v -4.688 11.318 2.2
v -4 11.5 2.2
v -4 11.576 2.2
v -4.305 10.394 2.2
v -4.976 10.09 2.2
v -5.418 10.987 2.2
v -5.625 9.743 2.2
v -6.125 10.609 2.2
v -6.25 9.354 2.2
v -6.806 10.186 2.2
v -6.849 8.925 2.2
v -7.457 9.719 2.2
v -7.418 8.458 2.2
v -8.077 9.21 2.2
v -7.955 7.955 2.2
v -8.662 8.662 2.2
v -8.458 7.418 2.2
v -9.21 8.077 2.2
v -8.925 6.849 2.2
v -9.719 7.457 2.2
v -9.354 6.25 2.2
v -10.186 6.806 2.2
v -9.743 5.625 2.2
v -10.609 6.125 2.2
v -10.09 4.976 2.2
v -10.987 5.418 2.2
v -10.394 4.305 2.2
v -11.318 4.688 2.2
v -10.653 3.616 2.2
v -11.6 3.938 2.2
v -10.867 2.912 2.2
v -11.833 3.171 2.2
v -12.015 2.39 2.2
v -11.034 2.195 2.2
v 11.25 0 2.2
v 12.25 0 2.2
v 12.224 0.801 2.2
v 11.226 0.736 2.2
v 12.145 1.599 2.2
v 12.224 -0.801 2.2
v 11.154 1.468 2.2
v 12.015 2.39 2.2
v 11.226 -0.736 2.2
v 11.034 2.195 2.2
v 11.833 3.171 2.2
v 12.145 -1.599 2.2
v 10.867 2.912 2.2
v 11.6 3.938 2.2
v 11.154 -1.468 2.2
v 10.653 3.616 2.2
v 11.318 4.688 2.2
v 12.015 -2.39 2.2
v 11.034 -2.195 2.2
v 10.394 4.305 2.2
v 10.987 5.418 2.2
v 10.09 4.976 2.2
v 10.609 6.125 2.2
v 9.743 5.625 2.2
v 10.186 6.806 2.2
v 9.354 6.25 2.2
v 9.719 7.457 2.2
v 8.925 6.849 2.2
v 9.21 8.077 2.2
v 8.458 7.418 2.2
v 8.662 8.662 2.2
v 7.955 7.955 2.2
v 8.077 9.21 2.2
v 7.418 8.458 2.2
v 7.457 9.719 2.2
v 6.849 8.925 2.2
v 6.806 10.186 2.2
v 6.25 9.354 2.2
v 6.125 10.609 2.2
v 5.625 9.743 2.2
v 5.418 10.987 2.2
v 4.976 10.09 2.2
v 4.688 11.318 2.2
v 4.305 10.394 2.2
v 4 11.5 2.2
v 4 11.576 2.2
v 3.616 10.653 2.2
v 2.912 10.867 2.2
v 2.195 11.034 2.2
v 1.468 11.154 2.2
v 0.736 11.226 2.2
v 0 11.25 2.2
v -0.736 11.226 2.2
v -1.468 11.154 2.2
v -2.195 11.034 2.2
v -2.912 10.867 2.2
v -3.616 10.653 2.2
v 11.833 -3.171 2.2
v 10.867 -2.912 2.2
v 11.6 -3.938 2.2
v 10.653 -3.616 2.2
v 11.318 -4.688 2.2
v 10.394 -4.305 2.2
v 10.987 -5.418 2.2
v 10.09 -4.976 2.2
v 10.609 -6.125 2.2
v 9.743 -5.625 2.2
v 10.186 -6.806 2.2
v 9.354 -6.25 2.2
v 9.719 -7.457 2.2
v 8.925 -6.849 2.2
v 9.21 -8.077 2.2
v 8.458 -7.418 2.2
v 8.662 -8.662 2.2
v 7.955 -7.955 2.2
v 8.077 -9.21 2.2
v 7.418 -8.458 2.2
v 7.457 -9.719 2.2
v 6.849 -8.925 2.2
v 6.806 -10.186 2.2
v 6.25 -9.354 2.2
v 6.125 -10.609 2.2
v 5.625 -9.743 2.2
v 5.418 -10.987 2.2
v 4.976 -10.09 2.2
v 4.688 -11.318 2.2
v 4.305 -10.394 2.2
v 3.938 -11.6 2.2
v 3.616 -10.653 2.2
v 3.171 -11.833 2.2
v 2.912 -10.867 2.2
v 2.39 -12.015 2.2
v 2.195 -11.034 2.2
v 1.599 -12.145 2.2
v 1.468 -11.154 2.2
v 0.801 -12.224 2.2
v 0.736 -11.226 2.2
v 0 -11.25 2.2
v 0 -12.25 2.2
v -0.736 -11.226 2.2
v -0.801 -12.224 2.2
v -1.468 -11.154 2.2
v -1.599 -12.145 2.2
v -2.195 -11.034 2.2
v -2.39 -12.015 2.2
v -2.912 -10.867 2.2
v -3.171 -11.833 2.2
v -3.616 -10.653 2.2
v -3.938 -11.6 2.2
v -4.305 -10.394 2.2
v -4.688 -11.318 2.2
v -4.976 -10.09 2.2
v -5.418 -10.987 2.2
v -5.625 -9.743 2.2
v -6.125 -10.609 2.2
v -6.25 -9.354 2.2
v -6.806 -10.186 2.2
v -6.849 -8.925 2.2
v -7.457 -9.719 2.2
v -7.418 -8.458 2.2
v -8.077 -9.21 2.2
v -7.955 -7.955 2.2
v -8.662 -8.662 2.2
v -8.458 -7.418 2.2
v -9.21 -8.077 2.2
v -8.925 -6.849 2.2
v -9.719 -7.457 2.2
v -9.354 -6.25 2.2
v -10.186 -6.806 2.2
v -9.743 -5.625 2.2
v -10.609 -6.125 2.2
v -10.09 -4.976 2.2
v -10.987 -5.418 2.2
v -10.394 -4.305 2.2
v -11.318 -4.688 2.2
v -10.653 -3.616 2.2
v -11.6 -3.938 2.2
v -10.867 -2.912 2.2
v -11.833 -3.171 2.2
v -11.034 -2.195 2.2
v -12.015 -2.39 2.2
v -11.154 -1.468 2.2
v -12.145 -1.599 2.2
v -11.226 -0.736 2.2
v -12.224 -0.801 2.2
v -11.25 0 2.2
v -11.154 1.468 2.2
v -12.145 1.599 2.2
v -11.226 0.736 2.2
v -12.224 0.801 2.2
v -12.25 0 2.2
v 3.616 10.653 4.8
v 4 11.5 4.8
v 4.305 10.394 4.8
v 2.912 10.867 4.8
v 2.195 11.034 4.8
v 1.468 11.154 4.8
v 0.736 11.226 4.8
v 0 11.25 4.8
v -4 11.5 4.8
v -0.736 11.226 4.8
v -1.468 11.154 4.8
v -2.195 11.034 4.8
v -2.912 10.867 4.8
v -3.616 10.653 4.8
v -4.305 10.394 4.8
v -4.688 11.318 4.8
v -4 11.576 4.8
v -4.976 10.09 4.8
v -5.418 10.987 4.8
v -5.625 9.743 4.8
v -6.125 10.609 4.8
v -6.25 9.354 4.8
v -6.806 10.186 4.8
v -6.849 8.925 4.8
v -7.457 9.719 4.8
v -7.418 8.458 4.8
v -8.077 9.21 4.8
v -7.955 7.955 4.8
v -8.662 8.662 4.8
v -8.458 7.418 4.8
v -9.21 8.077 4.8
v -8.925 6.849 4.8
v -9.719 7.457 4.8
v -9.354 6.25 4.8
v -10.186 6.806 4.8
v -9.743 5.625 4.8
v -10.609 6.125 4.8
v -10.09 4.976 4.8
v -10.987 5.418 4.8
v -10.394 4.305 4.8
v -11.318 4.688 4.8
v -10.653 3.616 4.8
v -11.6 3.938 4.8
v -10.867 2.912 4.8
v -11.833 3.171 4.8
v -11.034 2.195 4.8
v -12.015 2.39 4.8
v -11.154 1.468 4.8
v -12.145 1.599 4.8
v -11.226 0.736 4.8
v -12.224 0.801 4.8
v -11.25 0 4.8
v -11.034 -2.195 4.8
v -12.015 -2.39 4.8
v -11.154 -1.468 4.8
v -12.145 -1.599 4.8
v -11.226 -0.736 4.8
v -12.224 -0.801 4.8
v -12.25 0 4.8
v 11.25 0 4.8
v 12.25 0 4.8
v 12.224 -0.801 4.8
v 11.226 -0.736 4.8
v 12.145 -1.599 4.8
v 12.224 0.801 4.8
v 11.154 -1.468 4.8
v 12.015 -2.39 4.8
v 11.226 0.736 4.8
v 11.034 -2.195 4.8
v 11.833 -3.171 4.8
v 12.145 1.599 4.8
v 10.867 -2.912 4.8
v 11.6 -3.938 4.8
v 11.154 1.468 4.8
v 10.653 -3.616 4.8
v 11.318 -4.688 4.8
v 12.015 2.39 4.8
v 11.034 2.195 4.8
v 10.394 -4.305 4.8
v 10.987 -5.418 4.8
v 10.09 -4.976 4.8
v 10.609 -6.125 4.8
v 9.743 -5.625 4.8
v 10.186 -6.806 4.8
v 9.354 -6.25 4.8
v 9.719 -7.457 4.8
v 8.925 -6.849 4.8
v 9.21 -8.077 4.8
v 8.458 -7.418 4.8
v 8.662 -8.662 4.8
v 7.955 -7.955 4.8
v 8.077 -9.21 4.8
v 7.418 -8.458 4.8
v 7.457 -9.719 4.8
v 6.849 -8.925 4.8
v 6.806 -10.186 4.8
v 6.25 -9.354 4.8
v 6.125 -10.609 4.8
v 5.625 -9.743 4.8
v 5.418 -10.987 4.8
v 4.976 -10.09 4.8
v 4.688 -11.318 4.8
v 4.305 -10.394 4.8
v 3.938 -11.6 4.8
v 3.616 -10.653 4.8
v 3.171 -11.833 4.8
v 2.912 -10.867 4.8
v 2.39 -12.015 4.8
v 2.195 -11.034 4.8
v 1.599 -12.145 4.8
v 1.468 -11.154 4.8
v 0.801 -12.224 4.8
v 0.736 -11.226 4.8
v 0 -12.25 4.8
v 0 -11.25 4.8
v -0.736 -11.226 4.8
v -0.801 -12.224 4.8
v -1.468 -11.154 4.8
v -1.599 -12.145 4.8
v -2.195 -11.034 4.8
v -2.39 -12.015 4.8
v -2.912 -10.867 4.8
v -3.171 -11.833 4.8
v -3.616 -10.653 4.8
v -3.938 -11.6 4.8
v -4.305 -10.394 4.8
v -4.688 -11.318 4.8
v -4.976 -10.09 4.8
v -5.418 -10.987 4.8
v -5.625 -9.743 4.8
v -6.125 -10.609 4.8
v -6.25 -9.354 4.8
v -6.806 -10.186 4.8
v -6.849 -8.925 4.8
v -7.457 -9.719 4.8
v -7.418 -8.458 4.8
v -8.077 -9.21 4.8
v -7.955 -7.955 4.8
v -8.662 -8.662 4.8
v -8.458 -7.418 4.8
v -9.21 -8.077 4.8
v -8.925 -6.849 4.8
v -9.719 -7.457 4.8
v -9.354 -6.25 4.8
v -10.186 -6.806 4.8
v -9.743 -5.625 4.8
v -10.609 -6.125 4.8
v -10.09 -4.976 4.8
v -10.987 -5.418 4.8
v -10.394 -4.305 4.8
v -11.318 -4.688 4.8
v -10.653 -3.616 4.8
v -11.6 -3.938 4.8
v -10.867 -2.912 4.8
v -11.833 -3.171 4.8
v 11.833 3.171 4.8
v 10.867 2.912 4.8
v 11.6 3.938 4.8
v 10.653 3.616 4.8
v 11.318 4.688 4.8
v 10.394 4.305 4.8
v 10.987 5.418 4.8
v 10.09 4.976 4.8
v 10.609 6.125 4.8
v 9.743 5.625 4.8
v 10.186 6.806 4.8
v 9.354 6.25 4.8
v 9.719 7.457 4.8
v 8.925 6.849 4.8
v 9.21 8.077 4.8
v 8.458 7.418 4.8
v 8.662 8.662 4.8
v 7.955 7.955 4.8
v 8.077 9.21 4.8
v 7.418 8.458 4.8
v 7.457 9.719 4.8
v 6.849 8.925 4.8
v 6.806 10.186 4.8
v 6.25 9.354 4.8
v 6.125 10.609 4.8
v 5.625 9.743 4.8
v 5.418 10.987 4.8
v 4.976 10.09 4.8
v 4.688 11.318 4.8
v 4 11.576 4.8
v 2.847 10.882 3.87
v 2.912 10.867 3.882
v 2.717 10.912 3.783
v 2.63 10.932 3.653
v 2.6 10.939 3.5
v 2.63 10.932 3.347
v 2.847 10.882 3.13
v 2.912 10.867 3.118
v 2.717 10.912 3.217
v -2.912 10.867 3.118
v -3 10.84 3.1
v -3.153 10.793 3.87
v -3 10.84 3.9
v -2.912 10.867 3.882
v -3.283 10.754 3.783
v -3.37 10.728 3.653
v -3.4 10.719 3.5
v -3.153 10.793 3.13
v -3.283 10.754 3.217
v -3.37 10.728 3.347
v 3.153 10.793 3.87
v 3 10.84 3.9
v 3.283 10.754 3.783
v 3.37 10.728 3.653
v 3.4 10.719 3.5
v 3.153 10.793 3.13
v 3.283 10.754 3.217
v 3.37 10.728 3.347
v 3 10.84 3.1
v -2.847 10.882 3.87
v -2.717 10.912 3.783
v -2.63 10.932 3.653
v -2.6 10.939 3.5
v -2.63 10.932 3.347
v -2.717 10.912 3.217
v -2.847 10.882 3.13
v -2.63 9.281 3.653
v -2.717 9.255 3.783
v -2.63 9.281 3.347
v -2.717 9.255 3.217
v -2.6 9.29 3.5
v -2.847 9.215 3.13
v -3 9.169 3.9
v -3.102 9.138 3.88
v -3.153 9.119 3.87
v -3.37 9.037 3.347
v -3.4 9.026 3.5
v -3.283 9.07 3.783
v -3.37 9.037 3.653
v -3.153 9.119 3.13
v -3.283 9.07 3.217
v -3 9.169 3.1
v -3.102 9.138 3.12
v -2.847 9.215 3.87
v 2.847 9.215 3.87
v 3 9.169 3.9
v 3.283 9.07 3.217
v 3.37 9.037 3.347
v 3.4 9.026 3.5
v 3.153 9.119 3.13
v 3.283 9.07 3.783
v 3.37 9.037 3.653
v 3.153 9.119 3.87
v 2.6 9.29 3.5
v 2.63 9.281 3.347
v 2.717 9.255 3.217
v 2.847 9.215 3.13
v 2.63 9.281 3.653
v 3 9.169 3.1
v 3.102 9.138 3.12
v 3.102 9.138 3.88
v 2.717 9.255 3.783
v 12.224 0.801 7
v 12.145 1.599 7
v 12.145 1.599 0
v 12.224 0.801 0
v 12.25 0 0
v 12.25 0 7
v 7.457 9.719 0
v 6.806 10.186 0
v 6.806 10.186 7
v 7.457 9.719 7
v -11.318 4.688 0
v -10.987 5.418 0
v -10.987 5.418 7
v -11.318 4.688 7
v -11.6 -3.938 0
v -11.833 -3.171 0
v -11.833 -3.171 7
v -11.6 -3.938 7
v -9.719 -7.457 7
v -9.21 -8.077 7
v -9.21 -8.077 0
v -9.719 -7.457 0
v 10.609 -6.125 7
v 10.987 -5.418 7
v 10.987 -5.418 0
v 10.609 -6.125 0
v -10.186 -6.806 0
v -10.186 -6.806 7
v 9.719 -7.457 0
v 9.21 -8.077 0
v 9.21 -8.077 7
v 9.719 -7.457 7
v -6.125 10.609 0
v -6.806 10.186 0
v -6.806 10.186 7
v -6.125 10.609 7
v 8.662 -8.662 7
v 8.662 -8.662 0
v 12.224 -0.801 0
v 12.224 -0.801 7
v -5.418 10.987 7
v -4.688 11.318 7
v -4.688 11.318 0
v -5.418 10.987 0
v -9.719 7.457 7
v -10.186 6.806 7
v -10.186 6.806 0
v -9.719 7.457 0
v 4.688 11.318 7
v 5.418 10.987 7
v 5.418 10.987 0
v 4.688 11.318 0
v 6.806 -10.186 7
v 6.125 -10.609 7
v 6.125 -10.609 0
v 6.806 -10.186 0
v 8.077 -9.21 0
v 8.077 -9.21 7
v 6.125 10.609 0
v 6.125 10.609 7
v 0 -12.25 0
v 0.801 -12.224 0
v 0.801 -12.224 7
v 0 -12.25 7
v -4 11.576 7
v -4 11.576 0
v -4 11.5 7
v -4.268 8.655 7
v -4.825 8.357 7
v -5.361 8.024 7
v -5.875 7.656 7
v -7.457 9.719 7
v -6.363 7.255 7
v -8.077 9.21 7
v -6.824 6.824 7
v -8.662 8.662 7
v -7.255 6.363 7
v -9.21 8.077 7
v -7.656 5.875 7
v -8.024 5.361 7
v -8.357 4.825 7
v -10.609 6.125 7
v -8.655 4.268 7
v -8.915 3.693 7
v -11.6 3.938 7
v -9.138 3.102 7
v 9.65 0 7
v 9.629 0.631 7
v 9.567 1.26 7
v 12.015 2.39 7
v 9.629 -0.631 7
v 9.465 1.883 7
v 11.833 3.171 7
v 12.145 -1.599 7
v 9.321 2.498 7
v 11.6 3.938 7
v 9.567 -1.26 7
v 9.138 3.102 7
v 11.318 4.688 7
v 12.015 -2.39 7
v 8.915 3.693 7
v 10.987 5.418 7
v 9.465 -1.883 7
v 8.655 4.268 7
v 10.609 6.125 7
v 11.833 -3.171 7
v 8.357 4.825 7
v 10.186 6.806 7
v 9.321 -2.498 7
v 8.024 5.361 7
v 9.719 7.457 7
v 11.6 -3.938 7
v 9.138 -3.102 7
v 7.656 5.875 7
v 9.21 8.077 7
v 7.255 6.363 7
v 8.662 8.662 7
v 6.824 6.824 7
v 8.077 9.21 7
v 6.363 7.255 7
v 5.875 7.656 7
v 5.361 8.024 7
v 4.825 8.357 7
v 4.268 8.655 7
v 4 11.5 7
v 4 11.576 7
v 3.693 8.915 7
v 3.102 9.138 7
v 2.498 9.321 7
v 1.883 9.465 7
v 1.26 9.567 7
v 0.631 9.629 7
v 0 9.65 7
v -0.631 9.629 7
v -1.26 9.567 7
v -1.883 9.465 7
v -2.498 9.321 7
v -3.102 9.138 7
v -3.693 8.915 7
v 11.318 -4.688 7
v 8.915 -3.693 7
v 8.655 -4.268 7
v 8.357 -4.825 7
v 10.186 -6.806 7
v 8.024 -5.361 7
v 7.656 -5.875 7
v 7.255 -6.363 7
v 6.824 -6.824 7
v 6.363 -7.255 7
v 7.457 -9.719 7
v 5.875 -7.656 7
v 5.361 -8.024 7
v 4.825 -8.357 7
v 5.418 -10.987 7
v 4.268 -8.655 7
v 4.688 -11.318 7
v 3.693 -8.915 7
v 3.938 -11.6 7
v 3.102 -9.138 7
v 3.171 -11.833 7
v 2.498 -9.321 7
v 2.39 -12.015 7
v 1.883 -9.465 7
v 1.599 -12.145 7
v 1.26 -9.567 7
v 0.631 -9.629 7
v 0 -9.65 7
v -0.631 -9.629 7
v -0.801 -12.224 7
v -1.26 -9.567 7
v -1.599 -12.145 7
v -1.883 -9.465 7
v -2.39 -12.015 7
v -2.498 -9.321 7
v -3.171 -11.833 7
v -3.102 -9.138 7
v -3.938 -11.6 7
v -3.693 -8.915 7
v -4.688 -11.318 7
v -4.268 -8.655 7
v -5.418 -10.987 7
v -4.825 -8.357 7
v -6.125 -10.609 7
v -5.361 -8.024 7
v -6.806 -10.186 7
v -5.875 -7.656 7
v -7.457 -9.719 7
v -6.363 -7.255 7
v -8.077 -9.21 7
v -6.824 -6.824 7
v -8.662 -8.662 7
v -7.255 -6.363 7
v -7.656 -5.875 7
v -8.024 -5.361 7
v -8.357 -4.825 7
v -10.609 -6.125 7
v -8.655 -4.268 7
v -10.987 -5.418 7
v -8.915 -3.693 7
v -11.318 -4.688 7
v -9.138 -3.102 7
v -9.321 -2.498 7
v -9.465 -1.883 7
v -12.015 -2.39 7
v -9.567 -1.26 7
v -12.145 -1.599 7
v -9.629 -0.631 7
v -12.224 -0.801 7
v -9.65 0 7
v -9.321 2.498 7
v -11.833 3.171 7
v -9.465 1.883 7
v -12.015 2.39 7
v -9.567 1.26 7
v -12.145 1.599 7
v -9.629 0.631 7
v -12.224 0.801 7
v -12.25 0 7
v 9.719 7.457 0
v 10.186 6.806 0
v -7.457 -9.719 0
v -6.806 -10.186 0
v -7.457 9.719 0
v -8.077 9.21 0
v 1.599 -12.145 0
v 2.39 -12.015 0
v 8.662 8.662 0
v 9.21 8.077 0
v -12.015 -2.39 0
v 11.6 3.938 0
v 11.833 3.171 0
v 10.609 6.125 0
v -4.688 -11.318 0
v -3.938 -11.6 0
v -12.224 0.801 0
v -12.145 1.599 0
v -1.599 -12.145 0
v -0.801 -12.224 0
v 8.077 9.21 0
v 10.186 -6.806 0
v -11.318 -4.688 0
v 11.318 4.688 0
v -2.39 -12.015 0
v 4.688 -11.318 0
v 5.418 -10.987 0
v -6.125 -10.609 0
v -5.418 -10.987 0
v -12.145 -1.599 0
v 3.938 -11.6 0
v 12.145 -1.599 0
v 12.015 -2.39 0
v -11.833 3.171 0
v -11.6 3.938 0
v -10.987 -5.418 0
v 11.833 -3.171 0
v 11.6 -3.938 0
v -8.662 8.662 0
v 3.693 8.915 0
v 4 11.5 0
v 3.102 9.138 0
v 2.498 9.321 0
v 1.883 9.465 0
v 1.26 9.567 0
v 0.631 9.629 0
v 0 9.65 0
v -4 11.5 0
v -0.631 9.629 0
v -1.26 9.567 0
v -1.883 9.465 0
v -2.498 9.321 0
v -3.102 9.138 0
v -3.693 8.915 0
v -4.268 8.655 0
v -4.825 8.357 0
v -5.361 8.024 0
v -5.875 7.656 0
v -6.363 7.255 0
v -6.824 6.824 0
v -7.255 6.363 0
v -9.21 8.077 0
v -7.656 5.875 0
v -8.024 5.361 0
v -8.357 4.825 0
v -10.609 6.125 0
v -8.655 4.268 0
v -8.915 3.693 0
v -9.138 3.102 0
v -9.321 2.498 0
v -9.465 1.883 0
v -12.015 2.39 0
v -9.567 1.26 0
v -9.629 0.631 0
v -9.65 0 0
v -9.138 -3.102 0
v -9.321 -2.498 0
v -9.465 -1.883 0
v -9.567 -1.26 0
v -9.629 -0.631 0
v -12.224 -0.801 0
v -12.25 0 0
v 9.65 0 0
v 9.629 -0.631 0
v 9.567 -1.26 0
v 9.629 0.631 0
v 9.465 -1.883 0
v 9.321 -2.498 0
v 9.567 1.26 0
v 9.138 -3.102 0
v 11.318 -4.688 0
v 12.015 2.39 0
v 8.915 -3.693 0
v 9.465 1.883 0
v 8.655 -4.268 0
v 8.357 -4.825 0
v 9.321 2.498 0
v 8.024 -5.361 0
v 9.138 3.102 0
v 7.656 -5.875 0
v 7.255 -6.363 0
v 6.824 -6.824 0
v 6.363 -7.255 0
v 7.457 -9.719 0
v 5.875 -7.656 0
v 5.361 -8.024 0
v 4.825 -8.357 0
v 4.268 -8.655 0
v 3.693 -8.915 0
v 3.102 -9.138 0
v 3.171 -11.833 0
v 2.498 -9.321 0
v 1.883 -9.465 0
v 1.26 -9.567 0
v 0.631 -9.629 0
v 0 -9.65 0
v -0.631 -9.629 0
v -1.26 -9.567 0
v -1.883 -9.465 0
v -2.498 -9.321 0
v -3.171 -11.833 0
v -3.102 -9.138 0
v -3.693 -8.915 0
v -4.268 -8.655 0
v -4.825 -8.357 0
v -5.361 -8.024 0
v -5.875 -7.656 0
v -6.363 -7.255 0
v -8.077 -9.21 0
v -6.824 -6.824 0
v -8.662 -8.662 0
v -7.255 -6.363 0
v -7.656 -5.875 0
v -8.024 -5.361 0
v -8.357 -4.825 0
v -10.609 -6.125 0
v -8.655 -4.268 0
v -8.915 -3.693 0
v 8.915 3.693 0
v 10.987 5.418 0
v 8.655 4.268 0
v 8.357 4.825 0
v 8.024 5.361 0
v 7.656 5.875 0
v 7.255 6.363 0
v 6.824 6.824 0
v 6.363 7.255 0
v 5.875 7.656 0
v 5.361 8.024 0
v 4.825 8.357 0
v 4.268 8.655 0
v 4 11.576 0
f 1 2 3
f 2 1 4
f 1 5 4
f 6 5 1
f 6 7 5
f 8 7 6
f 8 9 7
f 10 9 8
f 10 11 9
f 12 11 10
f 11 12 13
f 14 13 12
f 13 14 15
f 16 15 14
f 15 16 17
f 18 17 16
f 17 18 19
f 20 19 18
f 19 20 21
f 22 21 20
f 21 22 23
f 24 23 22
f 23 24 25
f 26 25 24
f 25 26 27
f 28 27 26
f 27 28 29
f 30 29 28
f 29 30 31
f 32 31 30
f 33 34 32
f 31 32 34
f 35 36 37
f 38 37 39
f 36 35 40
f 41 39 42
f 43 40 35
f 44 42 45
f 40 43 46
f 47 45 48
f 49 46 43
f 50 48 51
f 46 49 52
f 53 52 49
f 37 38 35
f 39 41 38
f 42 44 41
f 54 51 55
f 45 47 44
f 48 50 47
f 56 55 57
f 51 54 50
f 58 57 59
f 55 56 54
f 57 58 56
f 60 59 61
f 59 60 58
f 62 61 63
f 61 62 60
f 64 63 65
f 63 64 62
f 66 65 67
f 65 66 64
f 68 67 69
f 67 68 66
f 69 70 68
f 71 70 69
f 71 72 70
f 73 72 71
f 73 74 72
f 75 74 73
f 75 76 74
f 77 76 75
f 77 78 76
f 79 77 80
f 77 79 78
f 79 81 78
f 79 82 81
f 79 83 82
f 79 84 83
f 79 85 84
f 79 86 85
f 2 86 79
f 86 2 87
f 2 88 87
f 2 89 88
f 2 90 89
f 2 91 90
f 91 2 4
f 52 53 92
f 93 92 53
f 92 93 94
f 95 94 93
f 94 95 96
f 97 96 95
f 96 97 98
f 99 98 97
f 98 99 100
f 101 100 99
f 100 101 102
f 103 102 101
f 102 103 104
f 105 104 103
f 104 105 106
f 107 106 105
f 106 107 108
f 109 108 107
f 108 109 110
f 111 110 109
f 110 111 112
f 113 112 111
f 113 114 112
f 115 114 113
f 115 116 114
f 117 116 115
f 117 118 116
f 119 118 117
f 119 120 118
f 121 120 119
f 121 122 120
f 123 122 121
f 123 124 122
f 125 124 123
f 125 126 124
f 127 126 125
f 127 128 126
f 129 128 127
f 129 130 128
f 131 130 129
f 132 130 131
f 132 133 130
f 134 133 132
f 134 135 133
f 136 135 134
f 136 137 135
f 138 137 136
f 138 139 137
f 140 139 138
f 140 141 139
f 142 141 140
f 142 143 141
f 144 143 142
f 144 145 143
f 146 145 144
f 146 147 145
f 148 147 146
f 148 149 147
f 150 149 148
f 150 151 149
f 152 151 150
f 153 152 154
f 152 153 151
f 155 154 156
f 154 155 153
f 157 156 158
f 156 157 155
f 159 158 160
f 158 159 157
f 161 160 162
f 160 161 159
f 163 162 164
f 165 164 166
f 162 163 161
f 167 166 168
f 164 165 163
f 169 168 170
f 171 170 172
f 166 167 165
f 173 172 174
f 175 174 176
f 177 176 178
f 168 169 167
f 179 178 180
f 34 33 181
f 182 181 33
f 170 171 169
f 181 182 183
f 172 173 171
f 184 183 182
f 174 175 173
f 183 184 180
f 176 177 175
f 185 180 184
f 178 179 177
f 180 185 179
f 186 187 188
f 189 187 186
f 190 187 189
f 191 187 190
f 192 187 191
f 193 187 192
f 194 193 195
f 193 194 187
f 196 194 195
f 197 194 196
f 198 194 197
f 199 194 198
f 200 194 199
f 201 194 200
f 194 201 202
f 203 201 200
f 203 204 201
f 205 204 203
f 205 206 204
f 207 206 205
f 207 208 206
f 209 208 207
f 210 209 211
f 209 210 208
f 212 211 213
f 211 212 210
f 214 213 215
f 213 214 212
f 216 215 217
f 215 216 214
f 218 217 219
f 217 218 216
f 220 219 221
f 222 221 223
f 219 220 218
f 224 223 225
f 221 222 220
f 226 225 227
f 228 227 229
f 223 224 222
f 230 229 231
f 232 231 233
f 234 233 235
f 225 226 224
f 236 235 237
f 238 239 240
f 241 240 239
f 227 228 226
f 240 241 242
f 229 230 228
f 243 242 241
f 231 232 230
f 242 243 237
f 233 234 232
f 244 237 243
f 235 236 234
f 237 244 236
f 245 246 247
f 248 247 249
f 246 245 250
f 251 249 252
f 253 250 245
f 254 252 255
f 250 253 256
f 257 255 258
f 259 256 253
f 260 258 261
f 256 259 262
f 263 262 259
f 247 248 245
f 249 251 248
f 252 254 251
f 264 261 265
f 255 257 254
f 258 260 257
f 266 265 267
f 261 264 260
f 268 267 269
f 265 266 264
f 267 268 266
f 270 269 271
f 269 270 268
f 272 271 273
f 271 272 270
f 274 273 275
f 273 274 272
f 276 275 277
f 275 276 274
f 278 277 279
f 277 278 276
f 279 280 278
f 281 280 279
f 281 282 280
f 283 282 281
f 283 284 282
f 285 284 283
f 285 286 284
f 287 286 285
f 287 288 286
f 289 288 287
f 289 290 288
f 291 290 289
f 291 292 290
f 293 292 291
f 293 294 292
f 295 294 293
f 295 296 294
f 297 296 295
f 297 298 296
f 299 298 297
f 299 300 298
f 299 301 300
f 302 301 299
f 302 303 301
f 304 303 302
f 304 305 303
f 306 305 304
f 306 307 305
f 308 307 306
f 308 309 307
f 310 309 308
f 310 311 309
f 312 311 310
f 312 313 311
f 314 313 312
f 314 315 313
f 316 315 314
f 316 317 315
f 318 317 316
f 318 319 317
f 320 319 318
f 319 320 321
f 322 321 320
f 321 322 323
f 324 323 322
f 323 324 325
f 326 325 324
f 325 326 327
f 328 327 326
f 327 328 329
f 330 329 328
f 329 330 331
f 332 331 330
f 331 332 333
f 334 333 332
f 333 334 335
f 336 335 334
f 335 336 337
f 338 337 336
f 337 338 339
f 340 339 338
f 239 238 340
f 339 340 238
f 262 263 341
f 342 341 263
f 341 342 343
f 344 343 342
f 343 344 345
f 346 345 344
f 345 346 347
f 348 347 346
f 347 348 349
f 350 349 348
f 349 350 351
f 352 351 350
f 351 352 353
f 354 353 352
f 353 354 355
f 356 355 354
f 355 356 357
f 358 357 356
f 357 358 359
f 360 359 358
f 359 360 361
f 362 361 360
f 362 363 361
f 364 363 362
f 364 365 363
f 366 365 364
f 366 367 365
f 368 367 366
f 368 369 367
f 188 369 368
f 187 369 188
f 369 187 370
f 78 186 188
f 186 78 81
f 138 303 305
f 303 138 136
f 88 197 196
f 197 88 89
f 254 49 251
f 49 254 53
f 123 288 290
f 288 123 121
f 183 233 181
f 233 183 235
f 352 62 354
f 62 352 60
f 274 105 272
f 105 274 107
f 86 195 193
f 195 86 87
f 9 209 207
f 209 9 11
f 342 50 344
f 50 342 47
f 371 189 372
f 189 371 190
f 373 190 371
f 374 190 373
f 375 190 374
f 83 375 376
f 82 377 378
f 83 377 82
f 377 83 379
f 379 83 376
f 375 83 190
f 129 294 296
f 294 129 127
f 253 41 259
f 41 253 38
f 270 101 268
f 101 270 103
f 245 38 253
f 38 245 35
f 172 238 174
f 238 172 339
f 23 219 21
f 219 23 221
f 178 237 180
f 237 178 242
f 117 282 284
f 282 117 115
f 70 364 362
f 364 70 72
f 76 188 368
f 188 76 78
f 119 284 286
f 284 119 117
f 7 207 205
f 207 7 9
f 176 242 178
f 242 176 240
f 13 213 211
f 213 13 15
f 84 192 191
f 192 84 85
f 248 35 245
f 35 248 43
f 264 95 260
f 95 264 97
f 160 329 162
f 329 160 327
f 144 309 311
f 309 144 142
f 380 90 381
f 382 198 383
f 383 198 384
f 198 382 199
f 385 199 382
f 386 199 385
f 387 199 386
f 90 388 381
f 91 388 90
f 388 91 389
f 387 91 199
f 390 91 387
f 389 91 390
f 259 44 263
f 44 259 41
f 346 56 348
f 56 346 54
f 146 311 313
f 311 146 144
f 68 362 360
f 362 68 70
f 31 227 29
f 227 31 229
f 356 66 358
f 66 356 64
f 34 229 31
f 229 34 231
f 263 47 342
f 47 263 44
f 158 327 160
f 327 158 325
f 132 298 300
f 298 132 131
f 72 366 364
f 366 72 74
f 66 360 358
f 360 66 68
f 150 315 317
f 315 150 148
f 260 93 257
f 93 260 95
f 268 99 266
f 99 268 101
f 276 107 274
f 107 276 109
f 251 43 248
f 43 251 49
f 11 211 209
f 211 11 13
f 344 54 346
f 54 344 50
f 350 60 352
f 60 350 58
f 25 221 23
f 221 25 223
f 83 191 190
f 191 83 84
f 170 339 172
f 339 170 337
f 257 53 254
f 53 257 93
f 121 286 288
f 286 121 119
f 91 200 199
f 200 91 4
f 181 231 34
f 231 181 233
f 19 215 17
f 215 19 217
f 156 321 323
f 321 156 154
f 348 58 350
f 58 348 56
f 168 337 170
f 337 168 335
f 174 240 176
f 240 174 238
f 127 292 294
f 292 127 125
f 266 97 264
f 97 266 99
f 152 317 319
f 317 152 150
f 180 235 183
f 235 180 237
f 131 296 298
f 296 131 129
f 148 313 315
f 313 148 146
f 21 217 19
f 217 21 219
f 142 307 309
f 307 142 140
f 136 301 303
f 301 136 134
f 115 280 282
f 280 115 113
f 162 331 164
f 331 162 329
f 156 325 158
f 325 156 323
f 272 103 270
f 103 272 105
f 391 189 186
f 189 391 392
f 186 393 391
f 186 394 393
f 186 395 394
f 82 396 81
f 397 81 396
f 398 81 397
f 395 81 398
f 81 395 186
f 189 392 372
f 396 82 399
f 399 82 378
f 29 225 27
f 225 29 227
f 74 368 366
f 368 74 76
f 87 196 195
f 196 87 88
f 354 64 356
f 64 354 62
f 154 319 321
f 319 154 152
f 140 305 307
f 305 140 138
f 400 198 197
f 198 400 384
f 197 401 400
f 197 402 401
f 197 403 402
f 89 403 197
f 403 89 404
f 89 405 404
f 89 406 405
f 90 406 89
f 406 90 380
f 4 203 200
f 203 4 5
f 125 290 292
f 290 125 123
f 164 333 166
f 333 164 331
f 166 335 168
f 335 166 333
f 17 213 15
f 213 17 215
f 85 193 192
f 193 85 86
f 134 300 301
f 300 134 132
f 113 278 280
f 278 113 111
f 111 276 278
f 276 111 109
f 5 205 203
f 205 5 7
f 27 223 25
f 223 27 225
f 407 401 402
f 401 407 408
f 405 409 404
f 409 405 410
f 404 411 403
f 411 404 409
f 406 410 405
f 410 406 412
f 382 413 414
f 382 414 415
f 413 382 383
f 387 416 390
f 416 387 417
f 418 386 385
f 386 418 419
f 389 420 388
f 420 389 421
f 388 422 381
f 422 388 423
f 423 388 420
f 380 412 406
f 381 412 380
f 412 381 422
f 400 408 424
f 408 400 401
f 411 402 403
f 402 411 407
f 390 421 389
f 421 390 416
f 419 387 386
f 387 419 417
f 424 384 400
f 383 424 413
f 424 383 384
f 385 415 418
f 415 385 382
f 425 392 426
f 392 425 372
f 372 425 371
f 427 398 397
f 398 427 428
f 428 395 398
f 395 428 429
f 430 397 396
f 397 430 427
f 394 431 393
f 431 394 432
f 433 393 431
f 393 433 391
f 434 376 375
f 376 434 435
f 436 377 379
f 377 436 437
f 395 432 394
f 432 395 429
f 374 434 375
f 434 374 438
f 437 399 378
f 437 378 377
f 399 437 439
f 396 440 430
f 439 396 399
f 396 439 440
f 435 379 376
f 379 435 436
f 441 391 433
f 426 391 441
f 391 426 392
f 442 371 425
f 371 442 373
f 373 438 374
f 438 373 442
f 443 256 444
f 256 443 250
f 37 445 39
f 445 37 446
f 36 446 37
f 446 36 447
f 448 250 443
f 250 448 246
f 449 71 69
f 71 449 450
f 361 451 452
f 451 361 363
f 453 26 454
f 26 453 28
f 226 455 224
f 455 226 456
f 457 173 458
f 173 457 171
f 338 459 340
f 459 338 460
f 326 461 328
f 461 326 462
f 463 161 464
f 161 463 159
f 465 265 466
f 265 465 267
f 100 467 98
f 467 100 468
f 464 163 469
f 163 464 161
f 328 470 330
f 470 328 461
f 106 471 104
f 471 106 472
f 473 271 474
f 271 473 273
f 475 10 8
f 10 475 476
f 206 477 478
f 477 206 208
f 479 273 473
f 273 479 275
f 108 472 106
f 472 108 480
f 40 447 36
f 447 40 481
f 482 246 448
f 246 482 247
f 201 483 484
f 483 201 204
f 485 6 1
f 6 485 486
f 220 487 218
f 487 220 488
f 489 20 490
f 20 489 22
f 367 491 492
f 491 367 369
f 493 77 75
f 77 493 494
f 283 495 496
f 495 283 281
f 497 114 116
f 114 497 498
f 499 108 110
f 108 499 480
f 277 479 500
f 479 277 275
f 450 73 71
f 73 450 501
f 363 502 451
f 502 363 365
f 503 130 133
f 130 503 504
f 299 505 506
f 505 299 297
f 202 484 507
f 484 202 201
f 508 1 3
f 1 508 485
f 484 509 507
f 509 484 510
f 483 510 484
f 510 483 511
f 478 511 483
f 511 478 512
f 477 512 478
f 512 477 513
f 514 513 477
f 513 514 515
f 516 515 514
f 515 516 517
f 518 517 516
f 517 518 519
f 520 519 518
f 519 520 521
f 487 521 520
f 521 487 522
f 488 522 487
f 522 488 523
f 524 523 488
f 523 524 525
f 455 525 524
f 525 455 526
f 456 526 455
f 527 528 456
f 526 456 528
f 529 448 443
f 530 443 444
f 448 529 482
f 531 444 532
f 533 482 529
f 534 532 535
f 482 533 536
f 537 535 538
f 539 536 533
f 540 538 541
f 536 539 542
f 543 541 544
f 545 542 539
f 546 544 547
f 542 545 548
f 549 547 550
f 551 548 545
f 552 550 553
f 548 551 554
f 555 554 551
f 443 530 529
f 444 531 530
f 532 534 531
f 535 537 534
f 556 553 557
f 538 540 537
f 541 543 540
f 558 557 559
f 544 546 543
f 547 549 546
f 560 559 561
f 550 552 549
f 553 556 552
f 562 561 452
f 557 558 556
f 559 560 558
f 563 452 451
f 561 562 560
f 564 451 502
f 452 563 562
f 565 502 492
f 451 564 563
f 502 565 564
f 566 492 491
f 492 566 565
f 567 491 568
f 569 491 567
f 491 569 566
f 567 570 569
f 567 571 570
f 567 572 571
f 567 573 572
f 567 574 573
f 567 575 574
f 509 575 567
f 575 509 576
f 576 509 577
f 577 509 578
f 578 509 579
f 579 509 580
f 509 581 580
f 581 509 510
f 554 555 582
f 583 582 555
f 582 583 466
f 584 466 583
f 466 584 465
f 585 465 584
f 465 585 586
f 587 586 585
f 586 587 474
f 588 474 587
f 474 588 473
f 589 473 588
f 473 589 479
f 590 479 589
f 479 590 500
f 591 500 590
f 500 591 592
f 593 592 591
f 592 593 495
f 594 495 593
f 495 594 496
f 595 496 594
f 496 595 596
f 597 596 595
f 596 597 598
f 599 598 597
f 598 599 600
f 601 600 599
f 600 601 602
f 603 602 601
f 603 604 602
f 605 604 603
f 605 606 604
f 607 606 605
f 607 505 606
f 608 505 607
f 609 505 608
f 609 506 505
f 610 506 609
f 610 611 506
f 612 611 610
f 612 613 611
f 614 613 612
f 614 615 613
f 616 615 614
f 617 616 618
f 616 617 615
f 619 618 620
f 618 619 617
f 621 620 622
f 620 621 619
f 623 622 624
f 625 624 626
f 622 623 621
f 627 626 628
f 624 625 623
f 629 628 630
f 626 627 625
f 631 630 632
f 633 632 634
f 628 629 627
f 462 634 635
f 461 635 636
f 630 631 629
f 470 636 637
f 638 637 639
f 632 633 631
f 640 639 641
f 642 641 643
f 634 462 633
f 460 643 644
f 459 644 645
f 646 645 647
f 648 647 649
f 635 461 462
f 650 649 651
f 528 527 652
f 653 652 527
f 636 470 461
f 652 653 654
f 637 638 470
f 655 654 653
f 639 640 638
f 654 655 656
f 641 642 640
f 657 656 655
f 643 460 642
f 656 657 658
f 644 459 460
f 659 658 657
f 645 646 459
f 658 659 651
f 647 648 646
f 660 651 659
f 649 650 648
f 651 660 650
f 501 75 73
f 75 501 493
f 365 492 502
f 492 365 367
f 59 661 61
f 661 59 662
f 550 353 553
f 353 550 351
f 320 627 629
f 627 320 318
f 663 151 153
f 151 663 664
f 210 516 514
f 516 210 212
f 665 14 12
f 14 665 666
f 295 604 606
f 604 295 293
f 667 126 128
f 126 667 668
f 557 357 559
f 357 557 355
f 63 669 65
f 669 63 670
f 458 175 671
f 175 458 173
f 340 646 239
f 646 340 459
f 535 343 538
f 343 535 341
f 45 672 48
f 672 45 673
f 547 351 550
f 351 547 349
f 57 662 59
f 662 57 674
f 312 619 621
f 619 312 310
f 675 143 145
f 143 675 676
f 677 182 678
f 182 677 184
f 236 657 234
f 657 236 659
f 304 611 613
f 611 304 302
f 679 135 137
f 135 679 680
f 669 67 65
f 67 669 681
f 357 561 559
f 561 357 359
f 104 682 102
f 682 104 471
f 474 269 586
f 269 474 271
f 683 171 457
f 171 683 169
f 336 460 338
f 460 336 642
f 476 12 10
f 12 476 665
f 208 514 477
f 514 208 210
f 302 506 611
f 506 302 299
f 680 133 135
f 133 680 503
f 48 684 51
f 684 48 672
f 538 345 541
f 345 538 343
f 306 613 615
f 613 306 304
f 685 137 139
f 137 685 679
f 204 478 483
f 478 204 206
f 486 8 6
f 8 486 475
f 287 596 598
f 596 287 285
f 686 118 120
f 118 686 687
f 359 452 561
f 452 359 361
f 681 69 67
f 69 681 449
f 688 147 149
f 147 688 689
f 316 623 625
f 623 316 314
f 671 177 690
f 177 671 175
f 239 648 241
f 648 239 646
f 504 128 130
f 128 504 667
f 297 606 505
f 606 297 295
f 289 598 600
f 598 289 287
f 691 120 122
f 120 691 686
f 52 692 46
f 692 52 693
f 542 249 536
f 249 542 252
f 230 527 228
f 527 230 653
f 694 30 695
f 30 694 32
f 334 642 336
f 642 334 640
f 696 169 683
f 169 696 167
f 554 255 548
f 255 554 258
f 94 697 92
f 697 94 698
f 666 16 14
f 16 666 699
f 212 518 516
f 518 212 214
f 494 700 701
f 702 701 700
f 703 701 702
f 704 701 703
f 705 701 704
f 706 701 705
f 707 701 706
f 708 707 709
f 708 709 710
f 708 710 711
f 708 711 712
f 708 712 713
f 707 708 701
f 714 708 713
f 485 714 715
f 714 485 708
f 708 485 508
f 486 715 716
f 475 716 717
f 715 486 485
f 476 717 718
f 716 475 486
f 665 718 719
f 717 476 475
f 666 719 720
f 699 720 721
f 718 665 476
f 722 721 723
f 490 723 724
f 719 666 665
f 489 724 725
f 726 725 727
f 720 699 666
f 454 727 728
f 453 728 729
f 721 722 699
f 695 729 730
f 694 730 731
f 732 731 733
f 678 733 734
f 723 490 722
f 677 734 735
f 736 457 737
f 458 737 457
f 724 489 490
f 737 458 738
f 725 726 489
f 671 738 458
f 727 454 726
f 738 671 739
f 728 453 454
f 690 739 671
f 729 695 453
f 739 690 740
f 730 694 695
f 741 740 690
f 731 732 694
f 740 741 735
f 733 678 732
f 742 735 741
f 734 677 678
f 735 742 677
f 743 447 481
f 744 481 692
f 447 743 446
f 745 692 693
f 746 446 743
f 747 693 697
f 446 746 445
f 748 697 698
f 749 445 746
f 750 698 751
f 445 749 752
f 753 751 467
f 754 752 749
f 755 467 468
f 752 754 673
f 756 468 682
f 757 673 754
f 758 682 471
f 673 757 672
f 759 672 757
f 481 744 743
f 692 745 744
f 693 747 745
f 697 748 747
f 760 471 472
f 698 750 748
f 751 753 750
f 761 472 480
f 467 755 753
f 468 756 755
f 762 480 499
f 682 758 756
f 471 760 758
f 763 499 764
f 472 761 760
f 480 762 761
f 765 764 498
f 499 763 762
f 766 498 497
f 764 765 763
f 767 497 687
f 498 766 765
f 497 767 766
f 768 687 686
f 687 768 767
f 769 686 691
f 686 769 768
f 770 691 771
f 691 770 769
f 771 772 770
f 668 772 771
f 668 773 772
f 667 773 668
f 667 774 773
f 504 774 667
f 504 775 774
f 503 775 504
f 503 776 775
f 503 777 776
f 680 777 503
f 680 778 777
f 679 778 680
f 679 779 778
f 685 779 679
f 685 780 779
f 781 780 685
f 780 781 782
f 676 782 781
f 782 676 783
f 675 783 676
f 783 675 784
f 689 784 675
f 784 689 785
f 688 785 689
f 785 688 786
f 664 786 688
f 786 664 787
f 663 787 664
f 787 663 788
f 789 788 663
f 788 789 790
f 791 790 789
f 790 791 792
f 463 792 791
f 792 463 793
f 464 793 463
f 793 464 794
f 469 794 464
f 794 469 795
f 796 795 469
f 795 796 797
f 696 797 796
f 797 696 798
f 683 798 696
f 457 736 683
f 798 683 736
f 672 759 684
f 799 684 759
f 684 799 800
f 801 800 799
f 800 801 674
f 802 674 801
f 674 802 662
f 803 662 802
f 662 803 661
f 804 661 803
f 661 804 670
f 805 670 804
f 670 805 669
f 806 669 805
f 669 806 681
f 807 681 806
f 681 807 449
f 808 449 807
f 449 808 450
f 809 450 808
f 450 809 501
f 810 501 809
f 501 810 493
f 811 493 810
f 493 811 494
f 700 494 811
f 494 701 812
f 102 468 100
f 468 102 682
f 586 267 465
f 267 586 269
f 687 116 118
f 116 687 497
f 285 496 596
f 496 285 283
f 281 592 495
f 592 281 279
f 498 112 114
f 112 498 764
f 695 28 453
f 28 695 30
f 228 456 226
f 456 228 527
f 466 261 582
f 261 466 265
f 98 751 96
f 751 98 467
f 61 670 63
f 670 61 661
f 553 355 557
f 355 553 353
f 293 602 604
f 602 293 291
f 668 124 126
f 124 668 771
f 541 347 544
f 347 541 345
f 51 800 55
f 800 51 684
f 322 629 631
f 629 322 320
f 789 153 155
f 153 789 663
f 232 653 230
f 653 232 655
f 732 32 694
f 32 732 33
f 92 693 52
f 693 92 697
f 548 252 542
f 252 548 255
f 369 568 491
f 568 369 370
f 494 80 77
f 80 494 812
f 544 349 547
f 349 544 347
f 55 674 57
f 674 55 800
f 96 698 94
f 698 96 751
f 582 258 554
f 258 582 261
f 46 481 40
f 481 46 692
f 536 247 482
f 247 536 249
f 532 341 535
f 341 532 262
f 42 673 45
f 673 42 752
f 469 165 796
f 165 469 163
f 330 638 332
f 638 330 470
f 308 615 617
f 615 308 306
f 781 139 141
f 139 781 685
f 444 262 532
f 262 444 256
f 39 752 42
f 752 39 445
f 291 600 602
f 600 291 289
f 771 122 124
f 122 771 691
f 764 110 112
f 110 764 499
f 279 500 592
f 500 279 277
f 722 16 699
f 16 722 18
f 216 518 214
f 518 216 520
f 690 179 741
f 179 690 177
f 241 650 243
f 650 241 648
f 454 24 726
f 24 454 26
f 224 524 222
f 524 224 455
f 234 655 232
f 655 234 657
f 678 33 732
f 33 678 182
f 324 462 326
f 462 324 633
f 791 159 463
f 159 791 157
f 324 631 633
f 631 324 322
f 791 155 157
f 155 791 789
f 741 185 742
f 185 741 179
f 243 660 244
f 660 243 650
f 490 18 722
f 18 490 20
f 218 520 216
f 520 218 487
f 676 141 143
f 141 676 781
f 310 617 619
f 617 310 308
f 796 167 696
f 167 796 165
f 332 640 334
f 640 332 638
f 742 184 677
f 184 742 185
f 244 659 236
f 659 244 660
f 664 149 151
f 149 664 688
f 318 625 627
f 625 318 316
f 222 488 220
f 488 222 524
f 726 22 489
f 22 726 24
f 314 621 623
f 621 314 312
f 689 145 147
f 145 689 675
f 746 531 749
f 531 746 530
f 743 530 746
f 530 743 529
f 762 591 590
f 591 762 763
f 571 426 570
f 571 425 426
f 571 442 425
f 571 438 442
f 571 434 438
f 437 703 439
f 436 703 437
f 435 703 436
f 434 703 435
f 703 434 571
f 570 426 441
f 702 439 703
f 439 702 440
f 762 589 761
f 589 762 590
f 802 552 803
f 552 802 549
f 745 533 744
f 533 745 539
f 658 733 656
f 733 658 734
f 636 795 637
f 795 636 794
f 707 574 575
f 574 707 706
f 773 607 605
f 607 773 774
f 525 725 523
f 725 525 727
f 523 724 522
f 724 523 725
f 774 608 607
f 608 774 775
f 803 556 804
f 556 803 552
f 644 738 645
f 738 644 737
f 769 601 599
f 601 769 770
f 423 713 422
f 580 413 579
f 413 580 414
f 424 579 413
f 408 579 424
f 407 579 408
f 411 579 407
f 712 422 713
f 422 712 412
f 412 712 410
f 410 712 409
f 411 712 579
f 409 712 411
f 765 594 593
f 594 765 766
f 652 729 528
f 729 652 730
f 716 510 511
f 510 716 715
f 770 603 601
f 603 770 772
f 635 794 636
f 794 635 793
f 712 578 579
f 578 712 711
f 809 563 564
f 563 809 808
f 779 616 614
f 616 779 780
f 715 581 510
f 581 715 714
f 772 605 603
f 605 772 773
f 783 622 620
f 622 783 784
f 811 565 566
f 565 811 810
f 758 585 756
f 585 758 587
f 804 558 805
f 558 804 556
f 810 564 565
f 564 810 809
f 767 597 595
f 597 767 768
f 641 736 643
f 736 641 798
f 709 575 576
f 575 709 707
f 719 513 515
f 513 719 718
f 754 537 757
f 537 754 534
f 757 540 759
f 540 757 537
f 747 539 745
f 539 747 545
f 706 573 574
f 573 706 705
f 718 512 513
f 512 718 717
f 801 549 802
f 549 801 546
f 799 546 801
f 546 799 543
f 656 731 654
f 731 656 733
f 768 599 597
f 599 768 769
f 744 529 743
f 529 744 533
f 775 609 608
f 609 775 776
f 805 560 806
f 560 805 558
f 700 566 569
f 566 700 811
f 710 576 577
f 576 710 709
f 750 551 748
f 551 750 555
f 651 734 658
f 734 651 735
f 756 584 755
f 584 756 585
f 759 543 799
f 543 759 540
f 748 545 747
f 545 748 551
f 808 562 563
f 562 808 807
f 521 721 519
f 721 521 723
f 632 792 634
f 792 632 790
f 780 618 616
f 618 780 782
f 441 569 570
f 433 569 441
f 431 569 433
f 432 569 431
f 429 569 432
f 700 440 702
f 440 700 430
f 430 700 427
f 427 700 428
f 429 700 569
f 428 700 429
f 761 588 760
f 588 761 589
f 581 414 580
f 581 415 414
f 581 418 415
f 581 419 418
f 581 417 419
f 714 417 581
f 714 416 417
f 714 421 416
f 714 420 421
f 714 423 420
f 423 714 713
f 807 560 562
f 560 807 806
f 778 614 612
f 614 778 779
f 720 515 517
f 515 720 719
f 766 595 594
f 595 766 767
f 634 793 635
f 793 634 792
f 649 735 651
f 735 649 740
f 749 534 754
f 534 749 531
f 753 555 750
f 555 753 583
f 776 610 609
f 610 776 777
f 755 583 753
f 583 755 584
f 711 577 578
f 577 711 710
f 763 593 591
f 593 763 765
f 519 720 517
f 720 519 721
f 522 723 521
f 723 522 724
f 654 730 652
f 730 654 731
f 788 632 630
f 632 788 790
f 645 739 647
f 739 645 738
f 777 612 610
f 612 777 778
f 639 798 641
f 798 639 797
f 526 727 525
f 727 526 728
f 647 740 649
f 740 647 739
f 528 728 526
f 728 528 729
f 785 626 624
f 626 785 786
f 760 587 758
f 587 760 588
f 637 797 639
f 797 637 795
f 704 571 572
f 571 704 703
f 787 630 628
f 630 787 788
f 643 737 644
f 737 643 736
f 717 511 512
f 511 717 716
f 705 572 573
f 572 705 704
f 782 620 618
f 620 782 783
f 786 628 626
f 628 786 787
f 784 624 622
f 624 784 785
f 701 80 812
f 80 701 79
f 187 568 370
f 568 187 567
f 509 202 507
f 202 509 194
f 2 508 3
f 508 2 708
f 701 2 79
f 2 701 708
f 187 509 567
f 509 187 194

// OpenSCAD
// Phase-2 antenna experiment jigs (non-payment NFC only).
//   coil_former : ring-sized former with a channel for winding test coils
//   pancake_jig : two-plate jig for winding flat (spiral) coils
include <gl_lib.scad>
part = "coil_former";  // "coil_former" | "pancake_base" | "pancake_top"
cf_h = 7; cf_wall = 1.6; ch_w = 2.6; ch_d = 1.0;
pk_od = 18; pk_hub = 6; pk_gap = 0.25;  // set pk_gap ≈ 1.2 × wire OD (0.2 mm wire -> 0.25)

module coil_former() difference() {
    cylinder(d = finger_d + 0.3 + 2*cf_wall + 2*ch_d, h = cf_h);
    translate([0, 0, -1]) cylinder(d = finger_d + 0.3, h = cf_h + 2);
    translate([0, 0, (cf_h - ch_w)/2]) difference() {
        cylinder(d = finger_d + 10, h = ch_w);
        translate([0, 0, -1]) cylinder(d = finger_d + 0.3 + 2*cf_wall, h = ch_w + 2);
    }
    // flat seat for a test chip module + two lead holes
    translate([-4, finger_d/2 + cf_wall + ch_d - 0.6, -1]) cube([8, 5, cf_h + 2]);
    for (s = [-1, 1]) translate([s*3, 0, cf_h/2]) rotate([-90, 0, 0]) cylinder(d = 0.8, h = 30, $fn = 16);
}
module pancake_base() difference() {
    union() { cylinder(d = pk_od + 6, h = 2); cylinder(d = pk_hub, h = 2 + pk_gap); }
    translate([0, 0, -1]) cylinder(d = 3.2, h = 10);              // M3 bolt
    translate([pk_hub/2 - 0.2, -0.3, 2]) cube([pk_od, 0.6, 1]);   // inner lead exit slot
}
module pancake_top() difference() {
    cylinder(d = pk_od + 6, h = 2);
    translate([0, 0, -1]) cylinder(d = 3.2, h = 10);
    for (a = [0 : 60 : 359]) rotate(a) translate([pk_od/2 - 2, 0, -1]) cylinder(d = 2, h = 5); // glue/inspection ports
}
if (part == "coil_former") coil_former();
else if (part == "pancake_base") pancake_base();
else pancake_top();
